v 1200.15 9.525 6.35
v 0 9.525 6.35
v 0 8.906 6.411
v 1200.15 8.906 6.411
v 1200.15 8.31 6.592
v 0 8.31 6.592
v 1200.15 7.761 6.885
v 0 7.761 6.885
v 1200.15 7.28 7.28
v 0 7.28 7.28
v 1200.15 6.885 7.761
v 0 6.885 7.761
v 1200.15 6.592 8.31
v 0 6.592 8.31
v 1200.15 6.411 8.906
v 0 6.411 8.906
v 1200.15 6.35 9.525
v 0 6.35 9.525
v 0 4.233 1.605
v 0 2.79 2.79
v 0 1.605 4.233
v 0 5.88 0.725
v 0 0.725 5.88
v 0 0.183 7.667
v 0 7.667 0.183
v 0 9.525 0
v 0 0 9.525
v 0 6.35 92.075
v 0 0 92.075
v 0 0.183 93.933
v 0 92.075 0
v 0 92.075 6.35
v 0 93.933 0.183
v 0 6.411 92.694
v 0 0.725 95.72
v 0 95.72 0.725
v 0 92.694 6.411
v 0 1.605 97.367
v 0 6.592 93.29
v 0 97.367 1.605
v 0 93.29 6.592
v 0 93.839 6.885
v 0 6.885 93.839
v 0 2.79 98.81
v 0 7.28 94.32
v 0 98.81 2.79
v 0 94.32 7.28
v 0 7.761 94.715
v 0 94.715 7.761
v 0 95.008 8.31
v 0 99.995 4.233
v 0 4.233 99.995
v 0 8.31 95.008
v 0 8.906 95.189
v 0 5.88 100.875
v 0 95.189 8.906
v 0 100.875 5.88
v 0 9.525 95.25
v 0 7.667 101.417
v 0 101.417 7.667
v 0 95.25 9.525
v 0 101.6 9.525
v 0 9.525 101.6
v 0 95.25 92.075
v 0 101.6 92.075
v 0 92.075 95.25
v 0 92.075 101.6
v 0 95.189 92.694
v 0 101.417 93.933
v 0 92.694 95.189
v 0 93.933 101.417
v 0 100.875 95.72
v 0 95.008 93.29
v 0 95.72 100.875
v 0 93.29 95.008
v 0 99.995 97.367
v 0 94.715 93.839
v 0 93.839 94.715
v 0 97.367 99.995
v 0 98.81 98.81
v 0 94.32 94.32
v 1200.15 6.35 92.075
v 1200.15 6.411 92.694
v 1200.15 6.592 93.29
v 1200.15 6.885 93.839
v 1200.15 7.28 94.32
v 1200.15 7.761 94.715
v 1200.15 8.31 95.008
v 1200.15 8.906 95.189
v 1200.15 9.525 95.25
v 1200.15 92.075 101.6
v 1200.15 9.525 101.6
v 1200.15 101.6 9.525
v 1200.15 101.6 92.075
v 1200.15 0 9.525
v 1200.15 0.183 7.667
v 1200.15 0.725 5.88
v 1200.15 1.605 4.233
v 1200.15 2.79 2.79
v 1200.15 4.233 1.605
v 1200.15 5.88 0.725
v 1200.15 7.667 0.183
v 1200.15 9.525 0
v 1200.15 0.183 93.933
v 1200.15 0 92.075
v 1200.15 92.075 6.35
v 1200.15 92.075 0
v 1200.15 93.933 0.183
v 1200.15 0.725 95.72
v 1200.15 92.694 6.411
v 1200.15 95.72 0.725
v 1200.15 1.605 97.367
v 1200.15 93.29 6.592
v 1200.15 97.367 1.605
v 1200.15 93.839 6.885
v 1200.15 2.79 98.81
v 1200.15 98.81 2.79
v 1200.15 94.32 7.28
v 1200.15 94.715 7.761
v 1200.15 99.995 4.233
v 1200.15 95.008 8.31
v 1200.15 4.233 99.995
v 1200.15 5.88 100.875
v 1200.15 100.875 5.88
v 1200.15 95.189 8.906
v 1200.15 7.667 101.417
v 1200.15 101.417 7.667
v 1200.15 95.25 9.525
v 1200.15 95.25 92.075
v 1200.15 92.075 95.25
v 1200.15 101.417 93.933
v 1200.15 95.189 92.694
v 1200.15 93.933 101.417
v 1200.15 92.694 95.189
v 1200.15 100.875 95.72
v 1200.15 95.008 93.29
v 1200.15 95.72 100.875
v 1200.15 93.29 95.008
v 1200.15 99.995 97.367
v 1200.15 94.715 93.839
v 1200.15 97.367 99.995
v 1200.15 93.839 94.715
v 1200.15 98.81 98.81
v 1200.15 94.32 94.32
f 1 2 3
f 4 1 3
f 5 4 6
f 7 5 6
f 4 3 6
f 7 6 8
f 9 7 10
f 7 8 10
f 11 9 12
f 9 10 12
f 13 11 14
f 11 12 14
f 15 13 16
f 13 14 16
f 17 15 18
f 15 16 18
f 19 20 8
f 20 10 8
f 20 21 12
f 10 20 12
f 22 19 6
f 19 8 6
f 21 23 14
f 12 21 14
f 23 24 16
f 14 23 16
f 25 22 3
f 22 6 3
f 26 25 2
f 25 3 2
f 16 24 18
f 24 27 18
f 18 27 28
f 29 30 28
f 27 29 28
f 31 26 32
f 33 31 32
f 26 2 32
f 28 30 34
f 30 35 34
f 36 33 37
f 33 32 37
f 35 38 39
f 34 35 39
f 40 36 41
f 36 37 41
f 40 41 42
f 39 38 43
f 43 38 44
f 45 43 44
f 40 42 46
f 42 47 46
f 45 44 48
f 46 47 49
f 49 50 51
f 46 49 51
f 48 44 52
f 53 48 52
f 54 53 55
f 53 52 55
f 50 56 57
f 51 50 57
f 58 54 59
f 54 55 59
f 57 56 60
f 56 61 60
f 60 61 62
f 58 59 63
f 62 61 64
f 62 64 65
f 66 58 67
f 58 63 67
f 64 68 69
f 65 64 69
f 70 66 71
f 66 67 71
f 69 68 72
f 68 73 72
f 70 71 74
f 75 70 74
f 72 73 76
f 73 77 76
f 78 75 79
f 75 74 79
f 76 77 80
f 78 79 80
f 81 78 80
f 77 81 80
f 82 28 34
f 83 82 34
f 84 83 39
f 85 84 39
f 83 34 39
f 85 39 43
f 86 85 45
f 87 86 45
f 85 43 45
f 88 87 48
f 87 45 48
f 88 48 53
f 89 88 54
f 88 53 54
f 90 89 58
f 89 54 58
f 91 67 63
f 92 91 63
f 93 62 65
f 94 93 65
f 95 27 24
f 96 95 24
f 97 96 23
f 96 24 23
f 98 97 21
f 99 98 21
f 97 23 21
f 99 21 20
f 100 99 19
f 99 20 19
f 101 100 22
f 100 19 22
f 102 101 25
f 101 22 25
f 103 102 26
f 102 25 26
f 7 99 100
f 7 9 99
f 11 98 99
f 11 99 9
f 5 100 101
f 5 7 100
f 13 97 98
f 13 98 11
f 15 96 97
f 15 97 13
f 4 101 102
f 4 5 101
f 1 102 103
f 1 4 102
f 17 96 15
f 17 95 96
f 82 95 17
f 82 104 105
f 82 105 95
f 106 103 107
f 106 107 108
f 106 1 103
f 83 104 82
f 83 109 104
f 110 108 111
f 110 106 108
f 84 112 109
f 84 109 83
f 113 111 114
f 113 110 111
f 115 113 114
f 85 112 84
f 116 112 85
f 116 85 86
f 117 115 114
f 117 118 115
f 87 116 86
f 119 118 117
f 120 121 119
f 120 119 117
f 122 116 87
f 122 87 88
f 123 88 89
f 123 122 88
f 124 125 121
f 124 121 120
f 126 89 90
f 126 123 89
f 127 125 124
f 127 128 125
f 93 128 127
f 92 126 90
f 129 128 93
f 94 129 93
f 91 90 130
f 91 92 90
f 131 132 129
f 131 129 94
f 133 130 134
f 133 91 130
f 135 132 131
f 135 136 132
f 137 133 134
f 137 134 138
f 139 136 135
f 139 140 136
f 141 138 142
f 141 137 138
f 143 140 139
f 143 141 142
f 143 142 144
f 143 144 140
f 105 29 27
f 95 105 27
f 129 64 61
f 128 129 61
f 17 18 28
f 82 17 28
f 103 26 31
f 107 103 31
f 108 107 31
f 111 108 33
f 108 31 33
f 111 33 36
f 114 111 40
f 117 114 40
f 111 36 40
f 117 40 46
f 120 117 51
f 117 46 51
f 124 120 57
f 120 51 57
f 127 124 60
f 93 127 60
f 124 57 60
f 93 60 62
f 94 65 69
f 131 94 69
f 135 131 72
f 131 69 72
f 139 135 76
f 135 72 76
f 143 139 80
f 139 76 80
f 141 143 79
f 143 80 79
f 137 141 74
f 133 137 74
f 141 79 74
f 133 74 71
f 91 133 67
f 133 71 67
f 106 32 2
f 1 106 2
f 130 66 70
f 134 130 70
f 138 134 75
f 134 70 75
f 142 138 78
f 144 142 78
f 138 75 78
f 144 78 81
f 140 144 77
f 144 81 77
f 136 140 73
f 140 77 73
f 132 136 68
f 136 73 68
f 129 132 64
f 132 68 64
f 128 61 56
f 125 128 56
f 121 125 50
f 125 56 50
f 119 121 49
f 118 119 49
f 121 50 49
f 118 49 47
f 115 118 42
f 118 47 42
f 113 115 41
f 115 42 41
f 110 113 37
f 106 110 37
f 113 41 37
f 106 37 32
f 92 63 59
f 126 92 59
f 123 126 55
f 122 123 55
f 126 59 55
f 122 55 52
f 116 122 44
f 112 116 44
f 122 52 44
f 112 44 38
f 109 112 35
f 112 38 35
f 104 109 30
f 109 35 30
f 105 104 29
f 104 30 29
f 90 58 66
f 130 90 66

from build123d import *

# Parameters (mm, degrees)
F1_DEPTH = 1200.15


with BuildPart() as f1:
    # F0 (on Right) → F1 (new body)
    with BuildSketch(Plane.YZ):
        with BuildLine():
            ThreePointArc((0, 9.525), (2.789808, 2.789808), (9.525, 0))
            Line((9.525, 0), (92.075, 0))
            ThreePointArc((92.075, 0), (98.810192, 2.789808), (101.6, 9.525))
            Line((101.6, 9.525), (101.6, 92.075))
            ThreePointArc((101.6, 92.075), (98.810192, 98.810192), (92.075, 101.6))
            Line((92.075, 101.6), (9.525, 101.6))
            ThreePointArc((9.525, 101.6), (2.789808, 98.810192), (0, 92.075))
            Line((0, 92.075), (0, 9.525))
        make_face()
        with BuildLine():
            ThreePointArc((95.25, 9.525), (94.320064, 7.279936), (92.075, 6.35))
            Line((92.075, 6.35), (9.525, 6.35))
            ThreePointArc((9.525, 6.35), (7.279936, 7.279936), (6.35, 9.525))
            Line((6.35, 9.525), (6.35, 92.075))
            ThreePointArc((6.35, 92.075), (7.279936, 94.320064), (9.525, 95.25))
            Line((9.525, 95.25), (92.075, 95.25))
            ThreePointArc((92.075, 95.25), (94.320064, 94.320064), (95.25, 92.075))
            Line((95.25, 92.075), (95.25, 9.525))
        make_face(mode=Mode.SUBTRACT)
    extrude(amount=F1_DEPTH)


solid = f1.part
